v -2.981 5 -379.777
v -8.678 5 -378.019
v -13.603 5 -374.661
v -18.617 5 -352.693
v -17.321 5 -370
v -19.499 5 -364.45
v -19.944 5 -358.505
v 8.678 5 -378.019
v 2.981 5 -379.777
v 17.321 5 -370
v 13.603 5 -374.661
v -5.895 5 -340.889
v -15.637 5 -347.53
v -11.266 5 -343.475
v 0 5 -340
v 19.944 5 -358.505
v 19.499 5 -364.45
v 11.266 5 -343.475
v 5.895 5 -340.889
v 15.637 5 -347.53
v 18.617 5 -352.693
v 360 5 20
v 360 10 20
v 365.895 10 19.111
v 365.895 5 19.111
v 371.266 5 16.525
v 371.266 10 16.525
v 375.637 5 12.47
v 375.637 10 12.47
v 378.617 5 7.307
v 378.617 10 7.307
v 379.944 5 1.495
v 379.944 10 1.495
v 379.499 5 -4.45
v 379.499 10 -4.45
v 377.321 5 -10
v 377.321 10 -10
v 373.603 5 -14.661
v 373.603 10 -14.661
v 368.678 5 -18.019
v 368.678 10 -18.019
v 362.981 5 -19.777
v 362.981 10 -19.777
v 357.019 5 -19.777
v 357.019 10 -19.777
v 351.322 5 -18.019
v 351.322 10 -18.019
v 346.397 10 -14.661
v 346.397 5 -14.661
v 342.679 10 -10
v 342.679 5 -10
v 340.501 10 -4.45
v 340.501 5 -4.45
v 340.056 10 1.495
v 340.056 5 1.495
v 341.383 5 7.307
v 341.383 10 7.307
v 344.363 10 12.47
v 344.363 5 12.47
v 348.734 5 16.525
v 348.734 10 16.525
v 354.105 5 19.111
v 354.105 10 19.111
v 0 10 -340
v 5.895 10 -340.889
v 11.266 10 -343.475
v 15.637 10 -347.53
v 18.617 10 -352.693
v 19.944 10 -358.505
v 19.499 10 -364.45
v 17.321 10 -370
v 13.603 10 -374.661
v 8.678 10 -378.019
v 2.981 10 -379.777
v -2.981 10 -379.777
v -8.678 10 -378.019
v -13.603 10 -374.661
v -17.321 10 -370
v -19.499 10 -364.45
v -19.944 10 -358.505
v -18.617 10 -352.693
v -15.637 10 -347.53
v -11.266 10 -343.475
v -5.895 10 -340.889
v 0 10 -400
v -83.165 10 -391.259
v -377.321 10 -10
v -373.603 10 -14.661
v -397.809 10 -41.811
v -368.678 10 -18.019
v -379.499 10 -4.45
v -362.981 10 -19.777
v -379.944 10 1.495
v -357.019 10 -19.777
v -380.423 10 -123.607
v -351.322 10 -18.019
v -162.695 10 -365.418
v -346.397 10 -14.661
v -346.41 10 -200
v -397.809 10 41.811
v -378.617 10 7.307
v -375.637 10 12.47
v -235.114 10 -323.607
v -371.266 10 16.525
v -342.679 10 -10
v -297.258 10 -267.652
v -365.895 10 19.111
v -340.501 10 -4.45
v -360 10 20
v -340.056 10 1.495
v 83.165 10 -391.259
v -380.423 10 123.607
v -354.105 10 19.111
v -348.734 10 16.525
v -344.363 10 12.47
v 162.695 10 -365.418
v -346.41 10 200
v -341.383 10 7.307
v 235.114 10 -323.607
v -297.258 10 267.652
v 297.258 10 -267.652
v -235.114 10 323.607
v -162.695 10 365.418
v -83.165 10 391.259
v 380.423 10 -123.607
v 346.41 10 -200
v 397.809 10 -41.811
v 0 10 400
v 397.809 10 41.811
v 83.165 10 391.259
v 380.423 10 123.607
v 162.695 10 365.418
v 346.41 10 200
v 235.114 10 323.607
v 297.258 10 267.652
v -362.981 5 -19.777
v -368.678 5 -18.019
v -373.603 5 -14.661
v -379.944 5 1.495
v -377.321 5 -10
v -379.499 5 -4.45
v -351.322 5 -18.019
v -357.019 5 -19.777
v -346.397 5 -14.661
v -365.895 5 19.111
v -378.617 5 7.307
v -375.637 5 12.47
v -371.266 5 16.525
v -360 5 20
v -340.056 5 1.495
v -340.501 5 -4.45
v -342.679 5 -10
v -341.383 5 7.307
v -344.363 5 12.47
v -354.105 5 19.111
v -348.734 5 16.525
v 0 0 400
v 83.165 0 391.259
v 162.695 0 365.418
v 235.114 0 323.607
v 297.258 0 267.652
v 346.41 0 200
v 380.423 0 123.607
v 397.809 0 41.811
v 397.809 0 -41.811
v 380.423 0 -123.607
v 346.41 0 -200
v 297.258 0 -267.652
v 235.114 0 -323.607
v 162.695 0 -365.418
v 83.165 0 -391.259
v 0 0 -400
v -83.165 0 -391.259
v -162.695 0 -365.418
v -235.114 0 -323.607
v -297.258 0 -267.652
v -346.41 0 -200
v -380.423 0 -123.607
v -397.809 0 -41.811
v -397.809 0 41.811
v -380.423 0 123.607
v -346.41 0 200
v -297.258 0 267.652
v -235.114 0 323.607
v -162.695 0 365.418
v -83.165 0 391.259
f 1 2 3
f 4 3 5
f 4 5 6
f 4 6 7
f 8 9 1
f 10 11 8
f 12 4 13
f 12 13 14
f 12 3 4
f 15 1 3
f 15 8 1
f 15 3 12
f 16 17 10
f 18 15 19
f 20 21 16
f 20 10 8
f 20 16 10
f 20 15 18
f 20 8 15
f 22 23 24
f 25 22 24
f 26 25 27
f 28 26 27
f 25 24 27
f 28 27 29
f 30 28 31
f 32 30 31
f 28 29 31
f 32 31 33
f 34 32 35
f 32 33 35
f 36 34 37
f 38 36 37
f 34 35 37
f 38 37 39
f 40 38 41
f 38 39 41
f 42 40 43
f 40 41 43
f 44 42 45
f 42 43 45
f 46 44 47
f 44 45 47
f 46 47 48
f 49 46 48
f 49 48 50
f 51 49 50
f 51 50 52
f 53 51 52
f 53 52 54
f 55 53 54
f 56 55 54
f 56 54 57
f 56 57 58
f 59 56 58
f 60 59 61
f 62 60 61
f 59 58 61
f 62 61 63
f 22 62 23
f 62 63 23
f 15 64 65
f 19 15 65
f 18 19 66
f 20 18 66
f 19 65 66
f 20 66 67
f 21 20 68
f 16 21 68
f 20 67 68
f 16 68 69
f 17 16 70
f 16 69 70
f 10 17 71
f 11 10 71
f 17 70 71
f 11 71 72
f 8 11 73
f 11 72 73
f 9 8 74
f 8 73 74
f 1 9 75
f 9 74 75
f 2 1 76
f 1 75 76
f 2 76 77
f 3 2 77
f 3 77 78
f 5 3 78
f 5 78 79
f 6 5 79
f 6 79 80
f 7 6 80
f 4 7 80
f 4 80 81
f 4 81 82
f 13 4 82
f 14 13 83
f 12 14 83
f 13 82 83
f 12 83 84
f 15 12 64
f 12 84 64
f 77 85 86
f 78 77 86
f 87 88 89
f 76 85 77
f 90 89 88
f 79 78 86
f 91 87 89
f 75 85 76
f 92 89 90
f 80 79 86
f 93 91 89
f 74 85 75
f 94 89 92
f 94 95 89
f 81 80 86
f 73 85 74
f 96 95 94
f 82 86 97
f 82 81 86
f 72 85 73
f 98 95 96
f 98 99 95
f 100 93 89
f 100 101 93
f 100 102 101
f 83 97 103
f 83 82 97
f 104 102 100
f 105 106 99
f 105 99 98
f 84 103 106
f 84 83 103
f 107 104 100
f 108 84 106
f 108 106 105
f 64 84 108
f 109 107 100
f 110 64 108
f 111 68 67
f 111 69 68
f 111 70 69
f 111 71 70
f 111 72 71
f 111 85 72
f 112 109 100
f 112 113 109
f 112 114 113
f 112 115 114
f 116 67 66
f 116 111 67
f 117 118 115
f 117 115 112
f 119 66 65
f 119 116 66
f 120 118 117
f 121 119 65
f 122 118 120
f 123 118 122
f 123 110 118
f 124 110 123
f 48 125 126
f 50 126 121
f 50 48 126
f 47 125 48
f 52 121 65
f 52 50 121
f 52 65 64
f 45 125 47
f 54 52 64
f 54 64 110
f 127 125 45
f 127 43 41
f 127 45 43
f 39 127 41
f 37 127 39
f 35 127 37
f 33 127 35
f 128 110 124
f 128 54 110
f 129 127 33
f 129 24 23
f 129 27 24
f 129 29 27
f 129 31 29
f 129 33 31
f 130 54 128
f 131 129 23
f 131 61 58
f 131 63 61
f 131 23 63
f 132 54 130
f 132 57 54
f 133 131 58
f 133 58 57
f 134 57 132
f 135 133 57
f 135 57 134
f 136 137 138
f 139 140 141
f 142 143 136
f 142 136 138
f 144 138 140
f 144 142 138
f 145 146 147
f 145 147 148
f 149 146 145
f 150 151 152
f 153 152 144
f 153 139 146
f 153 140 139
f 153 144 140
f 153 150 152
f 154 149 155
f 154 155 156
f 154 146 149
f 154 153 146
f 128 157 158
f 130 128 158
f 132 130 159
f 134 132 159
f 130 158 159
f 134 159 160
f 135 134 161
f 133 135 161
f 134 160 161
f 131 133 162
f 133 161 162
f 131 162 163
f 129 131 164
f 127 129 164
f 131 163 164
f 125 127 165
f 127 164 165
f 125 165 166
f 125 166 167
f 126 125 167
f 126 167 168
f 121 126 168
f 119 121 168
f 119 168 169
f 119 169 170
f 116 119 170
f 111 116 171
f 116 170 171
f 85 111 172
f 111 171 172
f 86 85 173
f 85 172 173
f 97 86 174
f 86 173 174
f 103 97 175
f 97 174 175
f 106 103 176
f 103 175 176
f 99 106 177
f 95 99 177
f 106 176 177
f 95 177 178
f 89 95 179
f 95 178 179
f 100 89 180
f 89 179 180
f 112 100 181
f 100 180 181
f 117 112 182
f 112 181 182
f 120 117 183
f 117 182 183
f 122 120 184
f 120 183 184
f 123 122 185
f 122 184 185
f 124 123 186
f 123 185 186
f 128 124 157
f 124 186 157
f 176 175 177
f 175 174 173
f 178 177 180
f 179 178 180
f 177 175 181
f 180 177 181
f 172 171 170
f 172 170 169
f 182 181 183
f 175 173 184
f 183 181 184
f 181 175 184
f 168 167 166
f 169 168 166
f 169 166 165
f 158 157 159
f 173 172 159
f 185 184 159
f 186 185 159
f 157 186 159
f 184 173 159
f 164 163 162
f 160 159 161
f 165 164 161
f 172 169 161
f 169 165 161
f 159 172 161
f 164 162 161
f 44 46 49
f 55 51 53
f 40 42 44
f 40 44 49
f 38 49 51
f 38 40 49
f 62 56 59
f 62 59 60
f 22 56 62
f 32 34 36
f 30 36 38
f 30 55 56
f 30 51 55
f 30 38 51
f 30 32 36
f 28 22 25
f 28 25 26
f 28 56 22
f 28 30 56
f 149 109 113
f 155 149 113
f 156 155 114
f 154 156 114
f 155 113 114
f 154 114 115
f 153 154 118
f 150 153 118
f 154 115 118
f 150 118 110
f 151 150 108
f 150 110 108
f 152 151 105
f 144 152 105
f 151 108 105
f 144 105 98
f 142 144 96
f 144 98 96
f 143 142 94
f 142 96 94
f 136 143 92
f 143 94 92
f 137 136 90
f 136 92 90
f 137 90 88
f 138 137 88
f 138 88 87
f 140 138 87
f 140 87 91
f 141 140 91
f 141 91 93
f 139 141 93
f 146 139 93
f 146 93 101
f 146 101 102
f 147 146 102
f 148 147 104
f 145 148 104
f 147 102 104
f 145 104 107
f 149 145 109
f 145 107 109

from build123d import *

# Parameters (mm, degrees)
SKETCH1_R           = 400
BOSS_EXTRUDE1_DEPTH = 10
SKETCH2_R           = 20
CUT_EXTRUDE2_DEPTH  = 5


with BuildPart() as part:
    # Sketch1 → Boss-Extrude1 (new body)
    with BuildSketch(Plane(origin=(0, 0, 0), x_dir=(1, 0, 0), z_dir=(0, 1, 0))):
        with Locations(Location((0, 0, 0), (0, 0, 270))):
            Circle(SKETCH1_R)
    extrude(amount=BOSS_EXTRUDE1_DEPTH)

    # Sketch2 → Cut-Extrude2 (cut)
    with BuildSketch(Plane(origin=(0, 10, 0), x_dir=(1, 0, 0), z_dir=(0, 1, 0))):
        with Locations(Location((360, 0, 0), (0, 0, 270))):
            Circle(SKETCH2_R)
        with Locations(Location((-360, 0, 0), (0, 0, 270))):
            Circle(SKETCH2_R)
        with Locations(Location((0, 360, 0), (0, 0, 270))):
            Circle(SKETCH2_R)
    extrude(amount=-CUT_EXTRUDE2_DEPTH, mode=Mode.SUBTRACT)


solid = part.part
